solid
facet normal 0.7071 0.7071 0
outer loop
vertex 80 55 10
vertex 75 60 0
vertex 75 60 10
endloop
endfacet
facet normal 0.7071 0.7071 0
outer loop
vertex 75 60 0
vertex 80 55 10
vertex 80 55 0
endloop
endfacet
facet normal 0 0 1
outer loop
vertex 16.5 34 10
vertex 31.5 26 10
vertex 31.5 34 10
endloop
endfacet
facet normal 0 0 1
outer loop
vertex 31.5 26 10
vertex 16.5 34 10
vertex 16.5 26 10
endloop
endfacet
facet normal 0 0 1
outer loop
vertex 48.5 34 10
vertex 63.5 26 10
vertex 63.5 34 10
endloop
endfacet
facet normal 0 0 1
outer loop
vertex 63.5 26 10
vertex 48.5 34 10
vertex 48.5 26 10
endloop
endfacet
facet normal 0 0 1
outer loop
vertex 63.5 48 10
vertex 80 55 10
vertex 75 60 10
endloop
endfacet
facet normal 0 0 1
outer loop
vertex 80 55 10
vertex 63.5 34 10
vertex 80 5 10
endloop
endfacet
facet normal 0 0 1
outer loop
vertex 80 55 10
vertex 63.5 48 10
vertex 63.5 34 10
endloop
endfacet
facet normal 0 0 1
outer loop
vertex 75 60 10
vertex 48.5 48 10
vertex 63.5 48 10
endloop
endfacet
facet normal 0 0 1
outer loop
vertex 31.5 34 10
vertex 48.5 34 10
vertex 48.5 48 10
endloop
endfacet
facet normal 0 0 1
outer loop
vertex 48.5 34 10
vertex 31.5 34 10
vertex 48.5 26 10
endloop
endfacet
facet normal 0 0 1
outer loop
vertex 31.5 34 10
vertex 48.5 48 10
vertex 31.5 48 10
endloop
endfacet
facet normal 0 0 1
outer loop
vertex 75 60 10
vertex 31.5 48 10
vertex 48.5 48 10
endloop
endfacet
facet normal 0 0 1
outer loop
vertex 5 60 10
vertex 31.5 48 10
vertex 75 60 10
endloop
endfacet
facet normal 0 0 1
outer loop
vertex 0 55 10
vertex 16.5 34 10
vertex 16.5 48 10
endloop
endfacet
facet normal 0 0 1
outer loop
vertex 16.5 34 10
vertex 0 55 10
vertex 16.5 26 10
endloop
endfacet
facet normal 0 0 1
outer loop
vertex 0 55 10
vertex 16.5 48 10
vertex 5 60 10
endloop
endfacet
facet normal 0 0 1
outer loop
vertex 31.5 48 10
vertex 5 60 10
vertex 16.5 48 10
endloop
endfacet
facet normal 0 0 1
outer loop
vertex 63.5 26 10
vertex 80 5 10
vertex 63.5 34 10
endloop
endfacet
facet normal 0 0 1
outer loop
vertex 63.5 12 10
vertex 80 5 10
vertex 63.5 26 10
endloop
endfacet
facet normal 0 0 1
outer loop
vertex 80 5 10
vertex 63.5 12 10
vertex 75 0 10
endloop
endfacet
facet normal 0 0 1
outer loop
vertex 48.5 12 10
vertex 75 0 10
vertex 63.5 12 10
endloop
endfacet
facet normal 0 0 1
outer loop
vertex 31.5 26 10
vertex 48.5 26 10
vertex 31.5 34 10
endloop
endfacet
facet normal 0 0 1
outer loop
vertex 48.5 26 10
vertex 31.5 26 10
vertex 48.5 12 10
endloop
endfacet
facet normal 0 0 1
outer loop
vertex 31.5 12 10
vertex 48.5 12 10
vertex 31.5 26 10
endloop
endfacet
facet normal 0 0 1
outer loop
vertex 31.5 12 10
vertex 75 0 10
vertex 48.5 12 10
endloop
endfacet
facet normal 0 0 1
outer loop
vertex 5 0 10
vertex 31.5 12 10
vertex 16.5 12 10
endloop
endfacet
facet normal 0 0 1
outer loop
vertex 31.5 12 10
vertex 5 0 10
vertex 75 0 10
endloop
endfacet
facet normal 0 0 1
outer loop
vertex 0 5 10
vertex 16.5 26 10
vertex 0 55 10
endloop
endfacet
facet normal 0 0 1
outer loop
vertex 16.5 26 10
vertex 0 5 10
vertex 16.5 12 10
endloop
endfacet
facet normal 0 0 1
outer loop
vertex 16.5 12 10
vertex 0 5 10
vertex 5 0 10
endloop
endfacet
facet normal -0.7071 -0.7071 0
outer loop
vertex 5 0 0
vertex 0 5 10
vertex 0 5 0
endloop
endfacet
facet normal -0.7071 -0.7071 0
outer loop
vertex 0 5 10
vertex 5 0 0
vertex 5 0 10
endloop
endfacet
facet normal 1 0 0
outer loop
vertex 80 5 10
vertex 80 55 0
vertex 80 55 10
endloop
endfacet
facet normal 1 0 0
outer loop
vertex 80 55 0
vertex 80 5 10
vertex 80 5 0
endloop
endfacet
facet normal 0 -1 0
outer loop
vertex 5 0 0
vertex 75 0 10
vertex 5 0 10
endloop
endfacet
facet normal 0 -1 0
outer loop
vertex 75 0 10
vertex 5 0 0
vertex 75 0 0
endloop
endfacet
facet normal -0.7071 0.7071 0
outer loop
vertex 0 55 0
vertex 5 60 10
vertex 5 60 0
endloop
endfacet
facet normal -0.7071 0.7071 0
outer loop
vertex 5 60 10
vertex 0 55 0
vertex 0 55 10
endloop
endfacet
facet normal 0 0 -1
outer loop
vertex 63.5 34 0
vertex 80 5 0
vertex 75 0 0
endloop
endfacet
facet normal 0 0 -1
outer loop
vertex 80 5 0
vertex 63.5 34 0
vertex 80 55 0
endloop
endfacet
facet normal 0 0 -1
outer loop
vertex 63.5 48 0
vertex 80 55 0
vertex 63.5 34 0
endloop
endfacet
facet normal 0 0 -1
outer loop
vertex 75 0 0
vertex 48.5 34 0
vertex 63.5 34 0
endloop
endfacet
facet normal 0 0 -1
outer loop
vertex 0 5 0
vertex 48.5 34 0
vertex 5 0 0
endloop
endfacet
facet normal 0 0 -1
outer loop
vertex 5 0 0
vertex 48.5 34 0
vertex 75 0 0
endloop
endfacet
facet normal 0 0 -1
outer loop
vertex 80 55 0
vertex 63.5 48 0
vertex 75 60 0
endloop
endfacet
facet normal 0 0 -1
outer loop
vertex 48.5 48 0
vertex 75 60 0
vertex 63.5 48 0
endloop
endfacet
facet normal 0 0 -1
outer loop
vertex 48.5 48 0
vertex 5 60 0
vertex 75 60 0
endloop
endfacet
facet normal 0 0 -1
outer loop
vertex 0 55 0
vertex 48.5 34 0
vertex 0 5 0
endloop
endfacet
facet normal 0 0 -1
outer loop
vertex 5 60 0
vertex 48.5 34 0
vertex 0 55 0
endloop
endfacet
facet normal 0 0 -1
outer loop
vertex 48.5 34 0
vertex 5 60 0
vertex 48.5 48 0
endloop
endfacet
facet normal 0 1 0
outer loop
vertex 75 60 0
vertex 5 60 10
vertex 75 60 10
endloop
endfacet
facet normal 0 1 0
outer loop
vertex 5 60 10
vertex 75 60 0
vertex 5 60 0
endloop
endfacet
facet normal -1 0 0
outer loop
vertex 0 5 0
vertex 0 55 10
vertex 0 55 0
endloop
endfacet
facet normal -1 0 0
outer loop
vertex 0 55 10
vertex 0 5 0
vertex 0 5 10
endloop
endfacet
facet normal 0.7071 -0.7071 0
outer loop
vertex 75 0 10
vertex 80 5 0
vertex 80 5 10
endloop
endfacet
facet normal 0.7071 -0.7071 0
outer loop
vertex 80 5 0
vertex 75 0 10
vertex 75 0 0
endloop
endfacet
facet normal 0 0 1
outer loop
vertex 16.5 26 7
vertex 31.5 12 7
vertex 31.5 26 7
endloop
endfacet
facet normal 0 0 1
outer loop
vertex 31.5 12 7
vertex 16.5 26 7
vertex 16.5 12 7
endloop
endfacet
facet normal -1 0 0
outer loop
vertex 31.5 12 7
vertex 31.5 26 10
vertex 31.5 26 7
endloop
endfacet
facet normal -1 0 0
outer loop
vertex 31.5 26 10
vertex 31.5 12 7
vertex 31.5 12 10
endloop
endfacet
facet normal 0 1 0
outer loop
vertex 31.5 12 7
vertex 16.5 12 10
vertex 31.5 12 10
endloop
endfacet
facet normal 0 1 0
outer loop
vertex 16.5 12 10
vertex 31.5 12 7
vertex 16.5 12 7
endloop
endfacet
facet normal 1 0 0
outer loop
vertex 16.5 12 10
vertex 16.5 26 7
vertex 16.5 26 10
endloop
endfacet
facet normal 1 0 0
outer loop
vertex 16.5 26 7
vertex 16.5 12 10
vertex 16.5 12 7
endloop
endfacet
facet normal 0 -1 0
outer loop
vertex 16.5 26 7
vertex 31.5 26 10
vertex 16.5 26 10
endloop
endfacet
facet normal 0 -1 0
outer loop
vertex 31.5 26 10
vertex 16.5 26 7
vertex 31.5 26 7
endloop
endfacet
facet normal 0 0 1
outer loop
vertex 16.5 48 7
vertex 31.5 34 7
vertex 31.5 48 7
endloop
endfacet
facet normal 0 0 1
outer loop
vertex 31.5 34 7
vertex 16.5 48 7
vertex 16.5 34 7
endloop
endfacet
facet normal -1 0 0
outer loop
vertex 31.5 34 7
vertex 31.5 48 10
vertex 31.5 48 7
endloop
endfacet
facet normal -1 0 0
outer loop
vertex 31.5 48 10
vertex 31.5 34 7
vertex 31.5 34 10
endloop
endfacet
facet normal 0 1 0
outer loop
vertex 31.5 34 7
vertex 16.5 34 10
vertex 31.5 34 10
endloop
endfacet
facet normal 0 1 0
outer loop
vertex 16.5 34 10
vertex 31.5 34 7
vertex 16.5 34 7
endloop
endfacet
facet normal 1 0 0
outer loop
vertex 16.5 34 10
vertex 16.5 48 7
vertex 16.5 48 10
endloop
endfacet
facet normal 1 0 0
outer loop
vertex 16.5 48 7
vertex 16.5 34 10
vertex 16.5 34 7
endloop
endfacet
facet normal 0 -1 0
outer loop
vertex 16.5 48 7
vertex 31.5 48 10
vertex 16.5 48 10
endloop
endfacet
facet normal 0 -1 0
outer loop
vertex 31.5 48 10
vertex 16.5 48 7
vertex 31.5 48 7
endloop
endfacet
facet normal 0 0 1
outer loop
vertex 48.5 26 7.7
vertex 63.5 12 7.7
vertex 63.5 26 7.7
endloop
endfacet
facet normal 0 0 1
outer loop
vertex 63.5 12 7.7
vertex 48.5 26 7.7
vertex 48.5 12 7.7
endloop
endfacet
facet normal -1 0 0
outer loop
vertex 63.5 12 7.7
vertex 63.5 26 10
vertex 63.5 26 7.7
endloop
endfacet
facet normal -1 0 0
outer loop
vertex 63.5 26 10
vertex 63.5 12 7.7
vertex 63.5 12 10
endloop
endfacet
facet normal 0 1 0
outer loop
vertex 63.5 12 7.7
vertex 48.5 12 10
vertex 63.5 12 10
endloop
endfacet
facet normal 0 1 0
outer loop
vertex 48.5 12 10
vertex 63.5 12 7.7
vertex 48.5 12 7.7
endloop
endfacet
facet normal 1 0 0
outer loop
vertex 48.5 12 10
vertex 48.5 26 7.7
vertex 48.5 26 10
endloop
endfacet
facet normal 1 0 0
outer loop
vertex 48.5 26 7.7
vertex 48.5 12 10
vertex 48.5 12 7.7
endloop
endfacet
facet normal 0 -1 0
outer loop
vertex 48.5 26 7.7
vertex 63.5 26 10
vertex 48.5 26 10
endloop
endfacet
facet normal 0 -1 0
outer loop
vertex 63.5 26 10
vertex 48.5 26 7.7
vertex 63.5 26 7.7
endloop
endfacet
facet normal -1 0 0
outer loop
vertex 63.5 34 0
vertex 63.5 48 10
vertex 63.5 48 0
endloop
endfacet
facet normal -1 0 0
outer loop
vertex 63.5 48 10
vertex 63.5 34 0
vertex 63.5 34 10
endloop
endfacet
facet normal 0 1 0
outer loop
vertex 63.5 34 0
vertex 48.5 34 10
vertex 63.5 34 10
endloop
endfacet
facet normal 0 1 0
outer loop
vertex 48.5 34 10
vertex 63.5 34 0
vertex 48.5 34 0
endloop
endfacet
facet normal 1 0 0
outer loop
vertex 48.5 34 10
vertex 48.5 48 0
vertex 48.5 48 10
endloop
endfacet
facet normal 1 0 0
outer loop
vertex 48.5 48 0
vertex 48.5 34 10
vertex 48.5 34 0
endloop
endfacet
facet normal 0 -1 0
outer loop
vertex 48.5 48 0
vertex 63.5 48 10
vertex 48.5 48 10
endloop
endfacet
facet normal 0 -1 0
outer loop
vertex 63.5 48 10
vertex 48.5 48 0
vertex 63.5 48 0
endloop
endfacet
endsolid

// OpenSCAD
$fn = 32;

// ----------------------------------------------------------------------
// Windowed plate: 4 voids, 80 x 60 x 10 mm
// ----------------------------------------------------------------------

// --- parameters (mm) ---
plate_l = 80;             // plate length, X
plate_w = 60;             // plate width, Y
plate_t = 10;             // plate thickness, Z
edge_margin = 8;          // wall from the plate edge to any window
win_l = 15;               // pocket length
win_w = 14;               // pocket width
pitch_x = 32;             // grid pitch along X
pitch_y = 22;             // grid pitch along Y
depth_1 = 3;              // depth of void 1 (full thickness = through)
depth_2 = 3;              // depth of void 2 (full thickness = through)
depth_3 = 2.3;            // depth of void 3 (full thickness = through)
depth_4 = 10;             // depth of void 4 (full thickness = through)
corner_c = 5;             // corner chamfer of the plate

profile = [[5, 0], [75, 0], [80, 5], [80, 55], [75, 60], [5, 60], [0, 55], [0, 5]];  // primary outline, 8 points, counter clockwise
void_1 = [[16.5, 12], [31.5, 12], [31.5, 26], [16.5, 26]];  // pocket at grid node 0,0, 4 points
void_2 = [[16.5, 34], [31.5, 34], [31.5, 48], [16.5, 48]];  // pocket at grid node 0,1, 4 points
void_3 = [[48.5, 12], [63.5, 12], [63.5, 26], [48.5, 26]];  // pocket at grid node 1,0, 4 points
void_4 = [[48.5, 34], [63.5, 34], [63.5, 48], [48.5, 48]];  // pocket at grid node 1,1, 4 points

// --- the one profile operation ---
difference() {
  linear_extrude(height = plate_t) polygon(points = profile);
  translate([0, 0, plate_t - depth_1])
    linear_extrude(height = depth_1 + 1) polygon(points = void_1);
  translate([0, 0, plate_t - depth_2])
    linear_extrude(height = depth_2 + 1) polygon(points = void_2);
  translate([0, 0, plate_t - depth_3])
    linear_extrude(height = depth_3 + 1) polygon(points = void_3);
  translate([0, 0, -1])
    linear_extrude(height = plate_t + 2) polygon(points = void_4);
}
